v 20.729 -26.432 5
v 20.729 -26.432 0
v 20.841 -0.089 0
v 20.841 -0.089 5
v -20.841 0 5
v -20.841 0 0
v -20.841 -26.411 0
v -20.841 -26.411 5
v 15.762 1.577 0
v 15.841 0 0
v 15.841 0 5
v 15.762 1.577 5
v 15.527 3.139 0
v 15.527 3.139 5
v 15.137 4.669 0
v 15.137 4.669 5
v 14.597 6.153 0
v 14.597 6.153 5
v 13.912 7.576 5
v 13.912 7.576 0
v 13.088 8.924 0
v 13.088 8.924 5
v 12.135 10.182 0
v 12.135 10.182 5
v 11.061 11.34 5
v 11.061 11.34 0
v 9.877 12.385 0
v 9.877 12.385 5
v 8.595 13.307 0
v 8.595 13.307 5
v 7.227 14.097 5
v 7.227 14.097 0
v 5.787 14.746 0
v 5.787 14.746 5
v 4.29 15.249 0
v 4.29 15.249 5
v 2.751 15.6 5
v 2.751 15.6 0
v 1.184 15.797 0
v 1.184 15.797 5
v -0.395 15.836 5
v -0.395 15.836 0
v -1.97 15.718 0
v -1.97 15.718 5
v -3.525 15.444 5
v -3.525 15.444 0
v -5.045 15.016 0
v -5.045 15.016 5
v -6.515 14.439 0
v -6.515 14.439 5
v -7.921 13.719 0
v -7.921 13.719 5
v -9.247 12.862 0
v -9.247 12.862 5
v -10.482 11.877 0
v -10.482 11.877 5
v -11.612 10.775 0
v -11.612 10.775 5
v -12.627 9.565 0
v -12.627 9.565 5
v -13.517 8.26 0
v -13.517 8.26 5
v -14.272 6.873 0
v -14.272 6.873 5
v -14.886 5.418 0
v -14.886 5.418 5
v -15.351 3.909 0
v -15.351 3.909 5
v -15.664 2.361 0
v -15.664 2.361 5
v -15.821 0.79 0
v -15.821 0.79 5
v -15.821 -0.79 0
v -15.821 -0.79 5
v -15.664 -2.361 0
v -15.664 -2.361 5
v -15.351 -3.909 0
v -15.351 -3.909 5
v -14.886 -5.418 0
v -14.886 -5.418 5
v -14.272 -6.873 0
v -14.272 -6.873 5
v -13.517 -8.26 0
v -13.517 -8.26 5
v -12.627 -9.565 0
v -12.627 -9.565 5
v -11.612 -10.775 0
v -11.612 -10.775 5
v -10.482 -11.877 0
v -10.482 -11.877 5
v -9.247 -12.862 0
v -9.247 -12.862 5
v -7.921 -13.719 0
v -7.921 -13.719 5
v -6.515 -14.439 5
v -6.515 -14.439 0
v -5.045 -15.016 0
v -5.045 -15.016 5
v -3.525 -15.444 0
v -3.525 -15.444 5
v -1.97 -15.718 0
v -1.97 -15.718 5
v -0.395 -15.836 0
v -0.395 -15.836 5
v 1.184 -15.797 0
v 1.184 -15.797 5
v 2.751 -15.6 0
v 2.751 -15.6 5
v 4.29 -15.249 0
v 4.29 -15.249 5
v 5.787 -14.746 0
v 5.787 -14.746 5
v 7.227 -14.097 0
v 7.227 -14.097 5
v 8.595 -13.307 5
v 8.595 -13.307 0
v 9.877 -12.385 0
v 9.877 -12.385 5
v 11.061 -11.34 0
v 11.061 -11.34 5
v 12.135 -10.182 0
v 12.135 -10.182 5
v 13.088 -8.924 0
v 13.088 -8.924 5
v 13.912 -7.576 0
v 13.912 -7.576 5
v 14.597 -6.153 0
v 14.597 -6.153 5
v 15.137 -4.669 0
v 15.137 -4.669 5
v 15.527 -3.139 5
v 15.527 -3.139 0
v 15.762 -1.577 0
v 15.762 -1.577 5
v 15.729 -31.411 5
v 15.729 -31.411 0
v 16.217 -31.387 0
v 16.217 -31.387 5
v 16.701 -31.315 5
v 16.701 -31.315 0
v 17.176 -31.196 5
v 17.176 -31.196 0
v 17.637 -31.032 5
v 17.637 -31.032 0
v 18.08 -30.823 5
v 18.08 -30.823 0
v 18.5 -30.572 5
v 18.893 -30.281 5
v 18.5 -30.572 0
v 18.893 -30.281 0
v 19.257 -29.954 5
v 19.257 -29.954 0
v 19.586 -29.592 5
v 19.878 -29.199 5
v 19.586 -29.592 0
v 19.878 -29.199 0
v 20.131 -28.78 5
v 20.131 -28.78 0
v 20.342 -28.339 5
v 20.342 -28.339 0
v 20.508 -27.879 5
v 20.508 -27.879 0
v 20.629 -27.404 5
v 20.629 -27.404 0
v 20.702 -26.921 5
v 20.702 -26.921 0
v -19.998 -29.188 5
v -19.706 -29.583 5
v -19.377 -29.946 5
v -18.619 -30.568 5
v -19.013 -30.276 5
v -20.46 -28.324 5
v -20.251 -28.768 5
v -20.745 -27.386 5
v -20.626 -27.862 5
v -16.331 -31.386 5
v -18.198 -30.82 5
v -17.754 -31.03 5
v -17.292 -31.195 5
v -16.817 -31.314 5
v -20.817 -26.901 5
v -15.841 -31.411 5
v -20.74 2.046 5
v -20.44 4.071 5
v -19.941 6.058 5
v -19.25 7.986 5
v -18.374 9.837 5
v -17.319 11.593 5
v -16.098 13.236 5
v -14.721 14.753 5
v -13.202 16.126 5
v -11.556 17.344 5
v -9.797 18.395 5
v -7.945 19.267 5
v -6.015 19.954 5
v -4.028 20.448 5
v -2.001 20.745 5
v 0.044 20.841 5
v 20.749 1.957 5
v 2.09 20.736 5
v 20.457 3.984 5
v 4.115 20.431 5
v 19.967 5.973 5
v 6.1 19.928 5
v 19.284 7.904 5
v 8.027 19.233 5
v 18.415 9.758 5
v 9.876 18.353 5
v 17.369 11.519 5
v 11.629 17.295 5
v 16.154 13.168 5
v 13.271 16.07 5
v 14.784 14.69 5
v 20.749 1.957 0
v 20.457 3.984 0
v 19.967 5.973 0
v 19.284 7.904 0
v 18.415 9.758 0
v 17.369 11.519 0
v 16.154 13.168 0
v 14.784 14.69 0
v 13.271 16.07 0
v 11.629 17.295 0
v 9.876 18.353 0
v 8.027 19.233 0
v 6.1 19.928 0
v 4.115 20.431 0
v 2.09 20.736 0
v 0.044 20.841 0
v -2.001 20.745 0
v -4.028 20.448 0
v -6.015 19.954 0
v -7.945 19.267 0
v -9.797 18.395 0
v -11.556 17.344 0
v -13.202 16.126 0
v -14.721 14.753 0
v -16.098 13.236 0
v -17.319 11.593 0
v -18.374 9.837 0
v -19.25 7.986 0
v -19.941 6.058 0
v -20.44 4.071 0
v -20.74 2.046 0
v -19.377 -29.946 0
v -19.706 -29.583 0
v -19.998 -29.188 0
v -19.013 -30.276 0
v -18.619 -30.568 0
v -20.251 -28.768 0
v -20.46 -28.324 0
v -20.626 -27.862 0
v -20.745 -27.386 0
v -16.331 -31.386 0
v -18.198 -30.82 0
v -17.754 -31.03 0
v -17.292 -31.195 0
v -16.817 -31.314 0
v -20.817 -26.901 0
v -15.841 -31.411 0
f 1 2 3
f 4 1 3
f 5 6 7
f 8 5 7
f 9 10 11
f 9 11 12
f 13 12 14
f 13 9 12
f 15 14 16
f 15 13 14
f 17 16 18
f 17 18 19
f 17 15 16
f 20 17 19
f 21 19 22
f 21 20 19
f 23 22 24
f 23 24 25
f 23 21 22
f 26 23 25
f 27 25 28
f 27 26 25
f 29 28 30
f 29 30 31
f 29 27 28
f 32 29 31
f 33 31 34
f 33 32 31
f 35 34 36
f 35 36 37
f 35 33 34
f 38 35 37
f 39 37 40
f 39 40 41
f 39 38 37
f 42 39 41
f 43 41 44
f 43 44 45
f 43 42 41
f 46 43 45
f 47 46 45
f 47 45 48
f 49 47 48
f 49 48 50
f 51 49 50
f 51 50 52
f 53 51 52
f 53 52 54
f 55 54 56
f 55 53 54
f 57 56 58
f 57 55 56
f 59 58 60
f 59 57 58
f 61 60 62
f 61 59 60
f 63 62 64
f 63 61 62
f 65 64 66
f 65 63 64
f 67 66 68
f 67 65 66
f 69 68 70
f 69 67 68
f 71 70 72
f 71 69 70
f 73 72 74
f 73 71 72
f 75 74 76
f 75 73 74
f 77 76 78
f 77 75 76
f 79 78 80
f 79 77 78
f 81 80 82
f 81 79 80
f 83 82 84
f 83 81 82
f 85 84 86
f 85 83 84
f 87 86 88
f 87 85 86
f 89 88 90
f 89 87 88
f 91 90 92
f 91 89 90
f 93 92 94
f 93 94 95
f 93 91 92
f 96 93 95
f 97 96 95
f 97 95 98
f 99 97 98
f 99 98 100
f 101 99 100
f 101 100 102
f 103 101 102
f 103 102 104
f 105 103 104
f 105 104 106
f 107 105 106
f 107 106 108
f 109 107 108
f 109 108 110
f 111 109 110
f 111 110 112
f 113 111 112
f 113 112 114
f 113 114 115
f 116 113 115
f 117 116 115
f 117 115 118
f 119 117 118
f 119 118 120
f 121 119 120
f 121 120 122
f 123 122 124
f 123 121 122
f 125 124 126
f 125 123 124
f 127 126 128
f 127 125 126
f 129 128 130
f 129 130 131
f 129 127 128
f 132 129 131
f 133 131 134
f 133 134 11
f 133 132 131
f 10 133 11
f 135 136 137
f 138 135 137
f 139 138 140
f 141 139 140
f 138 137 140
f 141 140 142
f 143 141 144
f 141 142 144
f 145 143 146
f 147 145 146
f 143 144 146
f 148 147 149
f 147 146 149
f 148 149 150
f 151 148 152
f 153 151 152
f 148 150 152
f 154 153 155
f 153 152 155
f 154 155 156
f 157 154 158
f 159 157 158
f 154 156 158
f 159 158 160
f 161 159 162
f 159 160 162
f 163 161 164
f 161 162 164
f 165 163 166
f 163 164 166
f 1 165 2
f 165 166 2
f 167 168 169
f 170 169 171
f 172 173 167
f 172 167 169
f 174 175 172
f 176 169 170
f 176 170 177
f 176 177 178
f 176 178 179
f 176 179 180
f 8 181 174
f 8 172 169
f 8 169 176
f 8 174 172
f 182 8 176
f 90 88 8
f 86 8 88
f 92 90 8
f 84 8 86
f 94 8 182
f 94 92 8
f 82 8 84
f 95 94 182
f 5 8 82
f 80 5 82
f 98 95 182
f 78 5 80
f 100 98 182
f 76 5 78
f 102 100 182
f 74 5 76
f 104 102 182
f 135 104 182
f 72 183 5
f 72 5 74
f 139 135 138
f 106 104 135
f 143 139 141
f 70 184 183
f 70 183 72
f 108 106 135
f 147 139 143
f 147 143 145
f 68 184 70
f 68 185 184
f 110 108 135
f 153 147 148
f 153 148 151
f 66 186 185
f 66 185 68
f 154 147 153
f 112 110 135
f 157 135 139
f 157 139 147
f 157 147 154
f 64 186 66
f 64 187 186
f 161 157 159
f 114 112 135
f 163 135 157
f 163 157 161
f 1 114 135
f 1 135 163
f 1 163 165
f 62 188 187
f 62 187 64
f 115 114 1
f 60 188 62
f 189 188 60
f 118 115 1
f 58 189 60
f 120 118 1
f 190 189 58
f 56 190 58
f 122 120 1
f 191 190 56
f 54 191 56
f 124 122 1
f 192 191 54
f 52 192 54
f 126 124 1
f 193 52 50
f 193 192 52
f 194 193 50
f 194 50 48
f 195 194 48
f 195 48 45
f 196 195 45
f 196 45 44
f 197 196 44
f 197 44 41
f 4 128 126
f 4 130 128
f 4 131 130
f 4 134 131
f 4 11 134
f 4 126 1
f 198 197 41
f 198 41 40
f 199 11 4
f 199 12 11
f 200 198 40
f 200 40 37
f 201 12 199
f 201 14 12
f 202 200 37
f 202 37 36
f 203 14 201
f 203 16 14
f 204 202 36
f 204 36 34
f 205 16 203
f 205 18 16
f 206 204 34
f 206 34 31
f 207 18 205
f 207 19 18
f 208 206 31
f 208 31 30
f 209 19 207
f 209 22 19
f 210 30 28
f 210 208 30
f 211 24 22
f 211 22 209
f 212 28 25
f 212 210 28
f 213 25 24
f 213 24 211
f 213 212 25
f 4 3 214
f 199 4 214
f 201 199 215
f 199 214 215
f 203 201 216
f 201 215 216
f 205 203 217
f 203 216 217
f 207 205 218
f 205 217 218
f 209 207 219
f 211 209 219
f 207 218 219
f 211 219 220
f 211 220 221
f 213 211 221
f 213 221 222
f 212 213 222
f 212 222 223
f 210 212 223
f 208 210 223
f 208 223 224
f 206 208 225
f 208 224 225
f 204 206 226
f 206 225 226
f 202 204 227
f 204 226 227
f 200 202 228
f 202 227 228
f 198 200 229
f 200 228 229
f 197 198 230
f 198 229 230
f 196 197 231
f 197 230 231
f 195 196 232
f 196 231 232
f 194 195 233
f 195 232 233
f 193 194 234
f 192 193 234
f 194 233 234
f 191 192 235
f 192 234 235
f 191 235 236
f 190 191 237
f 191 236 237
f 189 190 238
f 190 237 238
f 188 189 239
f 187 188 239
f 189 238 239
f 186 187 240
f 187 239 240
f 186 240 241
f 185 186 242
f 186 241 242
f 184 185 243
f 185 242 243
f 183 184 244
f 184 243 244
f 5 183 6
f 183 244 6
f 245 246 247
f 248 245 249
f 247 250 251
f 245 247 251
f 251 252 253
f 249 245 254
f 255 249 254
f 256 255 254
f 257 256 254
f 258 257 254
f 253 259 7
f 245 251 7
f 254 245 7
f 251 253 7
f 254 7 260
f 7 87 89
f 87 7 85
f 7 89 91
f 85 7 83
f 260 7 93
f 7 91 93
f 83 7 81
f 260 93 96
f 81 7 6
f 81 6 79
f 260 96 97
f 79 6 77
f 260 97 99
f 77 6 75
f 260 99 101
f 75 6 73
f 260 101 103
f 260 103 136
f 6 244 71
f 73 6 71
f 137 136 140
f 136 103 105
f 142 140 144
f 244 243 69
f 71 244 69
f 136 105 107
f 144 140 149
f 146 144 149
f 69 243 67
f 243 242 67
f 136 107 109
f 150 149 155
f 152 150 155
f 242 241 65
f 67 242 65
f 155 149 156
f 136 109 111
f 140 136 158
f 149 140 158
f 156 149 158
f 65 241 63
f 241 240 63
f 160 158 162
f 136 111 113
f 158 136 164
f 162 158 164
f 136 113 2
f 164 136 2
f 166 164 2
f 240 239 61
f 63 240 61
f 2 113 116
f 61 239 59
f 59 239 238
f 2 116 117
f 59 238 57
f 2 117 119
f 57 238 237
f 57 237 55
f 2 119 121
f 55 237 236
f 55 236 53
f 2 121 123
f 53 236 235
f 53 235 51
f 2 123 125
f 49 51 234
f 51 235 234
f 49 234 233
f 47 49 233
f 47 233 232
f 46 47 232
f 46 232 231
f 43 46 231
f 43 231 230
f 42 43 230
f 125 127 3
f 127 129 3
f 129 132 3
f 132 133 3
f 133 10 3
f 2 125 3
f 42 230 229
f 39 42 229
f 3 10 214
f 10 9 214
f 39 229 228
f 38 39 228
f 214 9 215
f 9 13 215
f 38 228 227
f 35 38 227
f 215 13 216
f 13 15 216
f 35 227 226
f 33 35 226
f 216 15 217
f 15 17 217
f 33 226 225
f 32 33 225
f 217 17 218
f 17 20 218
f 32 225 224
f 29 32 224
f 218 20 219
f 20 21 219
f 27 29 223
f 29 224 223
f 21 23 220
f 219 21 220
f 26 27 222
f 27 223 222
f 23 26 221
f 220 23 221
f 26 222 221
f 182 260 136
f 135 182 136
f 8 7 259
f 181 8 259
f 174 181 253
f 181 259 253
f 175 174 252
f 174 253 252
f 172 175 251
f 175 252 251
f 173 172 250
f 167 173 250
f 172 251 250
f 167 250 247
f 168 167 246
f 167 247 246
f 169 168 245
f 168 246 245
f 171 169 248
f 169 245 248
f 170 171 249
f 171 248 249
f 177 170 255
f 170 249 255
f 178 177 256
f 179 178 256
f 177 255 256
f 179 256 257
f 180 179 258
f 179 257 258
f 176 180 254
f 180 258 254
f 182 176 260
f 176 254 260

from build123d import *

# Parameters (mm, degrees)
F0_R     = 15.841056
F1_DEPTH = 5


with BuildPart() as f1:
    # F0 (on Top) → F1 (new body)
    with BuildSketch(Plane.XY):
        with BuildLine():
            Line((20.728503, -26.431861), (20.840867, -0.088895))
            ThreePointArc((20.840867, -0.088895), (0.044448, 20.841009), (-20.841056, 0))
            Line((-20.841056, 0), (-20.841056, -26.410534))
            ThreePointArc((-20.841056, -26.410534), (-19.37659, -29.946068), (-15.841056, -31.410534))
            Line((-15.841056, -31.410534), (15.728548, -31.410534))
            ThreePointArc((15.728548, -31.410534), (19.256534, -29.9536), (20.728503, -26.431861))
        make_face()
        Circle(F0_R, mode=Mode.SUBTRACT)
    extrude(amount=F1_DEPTH)


solid = f1.part
